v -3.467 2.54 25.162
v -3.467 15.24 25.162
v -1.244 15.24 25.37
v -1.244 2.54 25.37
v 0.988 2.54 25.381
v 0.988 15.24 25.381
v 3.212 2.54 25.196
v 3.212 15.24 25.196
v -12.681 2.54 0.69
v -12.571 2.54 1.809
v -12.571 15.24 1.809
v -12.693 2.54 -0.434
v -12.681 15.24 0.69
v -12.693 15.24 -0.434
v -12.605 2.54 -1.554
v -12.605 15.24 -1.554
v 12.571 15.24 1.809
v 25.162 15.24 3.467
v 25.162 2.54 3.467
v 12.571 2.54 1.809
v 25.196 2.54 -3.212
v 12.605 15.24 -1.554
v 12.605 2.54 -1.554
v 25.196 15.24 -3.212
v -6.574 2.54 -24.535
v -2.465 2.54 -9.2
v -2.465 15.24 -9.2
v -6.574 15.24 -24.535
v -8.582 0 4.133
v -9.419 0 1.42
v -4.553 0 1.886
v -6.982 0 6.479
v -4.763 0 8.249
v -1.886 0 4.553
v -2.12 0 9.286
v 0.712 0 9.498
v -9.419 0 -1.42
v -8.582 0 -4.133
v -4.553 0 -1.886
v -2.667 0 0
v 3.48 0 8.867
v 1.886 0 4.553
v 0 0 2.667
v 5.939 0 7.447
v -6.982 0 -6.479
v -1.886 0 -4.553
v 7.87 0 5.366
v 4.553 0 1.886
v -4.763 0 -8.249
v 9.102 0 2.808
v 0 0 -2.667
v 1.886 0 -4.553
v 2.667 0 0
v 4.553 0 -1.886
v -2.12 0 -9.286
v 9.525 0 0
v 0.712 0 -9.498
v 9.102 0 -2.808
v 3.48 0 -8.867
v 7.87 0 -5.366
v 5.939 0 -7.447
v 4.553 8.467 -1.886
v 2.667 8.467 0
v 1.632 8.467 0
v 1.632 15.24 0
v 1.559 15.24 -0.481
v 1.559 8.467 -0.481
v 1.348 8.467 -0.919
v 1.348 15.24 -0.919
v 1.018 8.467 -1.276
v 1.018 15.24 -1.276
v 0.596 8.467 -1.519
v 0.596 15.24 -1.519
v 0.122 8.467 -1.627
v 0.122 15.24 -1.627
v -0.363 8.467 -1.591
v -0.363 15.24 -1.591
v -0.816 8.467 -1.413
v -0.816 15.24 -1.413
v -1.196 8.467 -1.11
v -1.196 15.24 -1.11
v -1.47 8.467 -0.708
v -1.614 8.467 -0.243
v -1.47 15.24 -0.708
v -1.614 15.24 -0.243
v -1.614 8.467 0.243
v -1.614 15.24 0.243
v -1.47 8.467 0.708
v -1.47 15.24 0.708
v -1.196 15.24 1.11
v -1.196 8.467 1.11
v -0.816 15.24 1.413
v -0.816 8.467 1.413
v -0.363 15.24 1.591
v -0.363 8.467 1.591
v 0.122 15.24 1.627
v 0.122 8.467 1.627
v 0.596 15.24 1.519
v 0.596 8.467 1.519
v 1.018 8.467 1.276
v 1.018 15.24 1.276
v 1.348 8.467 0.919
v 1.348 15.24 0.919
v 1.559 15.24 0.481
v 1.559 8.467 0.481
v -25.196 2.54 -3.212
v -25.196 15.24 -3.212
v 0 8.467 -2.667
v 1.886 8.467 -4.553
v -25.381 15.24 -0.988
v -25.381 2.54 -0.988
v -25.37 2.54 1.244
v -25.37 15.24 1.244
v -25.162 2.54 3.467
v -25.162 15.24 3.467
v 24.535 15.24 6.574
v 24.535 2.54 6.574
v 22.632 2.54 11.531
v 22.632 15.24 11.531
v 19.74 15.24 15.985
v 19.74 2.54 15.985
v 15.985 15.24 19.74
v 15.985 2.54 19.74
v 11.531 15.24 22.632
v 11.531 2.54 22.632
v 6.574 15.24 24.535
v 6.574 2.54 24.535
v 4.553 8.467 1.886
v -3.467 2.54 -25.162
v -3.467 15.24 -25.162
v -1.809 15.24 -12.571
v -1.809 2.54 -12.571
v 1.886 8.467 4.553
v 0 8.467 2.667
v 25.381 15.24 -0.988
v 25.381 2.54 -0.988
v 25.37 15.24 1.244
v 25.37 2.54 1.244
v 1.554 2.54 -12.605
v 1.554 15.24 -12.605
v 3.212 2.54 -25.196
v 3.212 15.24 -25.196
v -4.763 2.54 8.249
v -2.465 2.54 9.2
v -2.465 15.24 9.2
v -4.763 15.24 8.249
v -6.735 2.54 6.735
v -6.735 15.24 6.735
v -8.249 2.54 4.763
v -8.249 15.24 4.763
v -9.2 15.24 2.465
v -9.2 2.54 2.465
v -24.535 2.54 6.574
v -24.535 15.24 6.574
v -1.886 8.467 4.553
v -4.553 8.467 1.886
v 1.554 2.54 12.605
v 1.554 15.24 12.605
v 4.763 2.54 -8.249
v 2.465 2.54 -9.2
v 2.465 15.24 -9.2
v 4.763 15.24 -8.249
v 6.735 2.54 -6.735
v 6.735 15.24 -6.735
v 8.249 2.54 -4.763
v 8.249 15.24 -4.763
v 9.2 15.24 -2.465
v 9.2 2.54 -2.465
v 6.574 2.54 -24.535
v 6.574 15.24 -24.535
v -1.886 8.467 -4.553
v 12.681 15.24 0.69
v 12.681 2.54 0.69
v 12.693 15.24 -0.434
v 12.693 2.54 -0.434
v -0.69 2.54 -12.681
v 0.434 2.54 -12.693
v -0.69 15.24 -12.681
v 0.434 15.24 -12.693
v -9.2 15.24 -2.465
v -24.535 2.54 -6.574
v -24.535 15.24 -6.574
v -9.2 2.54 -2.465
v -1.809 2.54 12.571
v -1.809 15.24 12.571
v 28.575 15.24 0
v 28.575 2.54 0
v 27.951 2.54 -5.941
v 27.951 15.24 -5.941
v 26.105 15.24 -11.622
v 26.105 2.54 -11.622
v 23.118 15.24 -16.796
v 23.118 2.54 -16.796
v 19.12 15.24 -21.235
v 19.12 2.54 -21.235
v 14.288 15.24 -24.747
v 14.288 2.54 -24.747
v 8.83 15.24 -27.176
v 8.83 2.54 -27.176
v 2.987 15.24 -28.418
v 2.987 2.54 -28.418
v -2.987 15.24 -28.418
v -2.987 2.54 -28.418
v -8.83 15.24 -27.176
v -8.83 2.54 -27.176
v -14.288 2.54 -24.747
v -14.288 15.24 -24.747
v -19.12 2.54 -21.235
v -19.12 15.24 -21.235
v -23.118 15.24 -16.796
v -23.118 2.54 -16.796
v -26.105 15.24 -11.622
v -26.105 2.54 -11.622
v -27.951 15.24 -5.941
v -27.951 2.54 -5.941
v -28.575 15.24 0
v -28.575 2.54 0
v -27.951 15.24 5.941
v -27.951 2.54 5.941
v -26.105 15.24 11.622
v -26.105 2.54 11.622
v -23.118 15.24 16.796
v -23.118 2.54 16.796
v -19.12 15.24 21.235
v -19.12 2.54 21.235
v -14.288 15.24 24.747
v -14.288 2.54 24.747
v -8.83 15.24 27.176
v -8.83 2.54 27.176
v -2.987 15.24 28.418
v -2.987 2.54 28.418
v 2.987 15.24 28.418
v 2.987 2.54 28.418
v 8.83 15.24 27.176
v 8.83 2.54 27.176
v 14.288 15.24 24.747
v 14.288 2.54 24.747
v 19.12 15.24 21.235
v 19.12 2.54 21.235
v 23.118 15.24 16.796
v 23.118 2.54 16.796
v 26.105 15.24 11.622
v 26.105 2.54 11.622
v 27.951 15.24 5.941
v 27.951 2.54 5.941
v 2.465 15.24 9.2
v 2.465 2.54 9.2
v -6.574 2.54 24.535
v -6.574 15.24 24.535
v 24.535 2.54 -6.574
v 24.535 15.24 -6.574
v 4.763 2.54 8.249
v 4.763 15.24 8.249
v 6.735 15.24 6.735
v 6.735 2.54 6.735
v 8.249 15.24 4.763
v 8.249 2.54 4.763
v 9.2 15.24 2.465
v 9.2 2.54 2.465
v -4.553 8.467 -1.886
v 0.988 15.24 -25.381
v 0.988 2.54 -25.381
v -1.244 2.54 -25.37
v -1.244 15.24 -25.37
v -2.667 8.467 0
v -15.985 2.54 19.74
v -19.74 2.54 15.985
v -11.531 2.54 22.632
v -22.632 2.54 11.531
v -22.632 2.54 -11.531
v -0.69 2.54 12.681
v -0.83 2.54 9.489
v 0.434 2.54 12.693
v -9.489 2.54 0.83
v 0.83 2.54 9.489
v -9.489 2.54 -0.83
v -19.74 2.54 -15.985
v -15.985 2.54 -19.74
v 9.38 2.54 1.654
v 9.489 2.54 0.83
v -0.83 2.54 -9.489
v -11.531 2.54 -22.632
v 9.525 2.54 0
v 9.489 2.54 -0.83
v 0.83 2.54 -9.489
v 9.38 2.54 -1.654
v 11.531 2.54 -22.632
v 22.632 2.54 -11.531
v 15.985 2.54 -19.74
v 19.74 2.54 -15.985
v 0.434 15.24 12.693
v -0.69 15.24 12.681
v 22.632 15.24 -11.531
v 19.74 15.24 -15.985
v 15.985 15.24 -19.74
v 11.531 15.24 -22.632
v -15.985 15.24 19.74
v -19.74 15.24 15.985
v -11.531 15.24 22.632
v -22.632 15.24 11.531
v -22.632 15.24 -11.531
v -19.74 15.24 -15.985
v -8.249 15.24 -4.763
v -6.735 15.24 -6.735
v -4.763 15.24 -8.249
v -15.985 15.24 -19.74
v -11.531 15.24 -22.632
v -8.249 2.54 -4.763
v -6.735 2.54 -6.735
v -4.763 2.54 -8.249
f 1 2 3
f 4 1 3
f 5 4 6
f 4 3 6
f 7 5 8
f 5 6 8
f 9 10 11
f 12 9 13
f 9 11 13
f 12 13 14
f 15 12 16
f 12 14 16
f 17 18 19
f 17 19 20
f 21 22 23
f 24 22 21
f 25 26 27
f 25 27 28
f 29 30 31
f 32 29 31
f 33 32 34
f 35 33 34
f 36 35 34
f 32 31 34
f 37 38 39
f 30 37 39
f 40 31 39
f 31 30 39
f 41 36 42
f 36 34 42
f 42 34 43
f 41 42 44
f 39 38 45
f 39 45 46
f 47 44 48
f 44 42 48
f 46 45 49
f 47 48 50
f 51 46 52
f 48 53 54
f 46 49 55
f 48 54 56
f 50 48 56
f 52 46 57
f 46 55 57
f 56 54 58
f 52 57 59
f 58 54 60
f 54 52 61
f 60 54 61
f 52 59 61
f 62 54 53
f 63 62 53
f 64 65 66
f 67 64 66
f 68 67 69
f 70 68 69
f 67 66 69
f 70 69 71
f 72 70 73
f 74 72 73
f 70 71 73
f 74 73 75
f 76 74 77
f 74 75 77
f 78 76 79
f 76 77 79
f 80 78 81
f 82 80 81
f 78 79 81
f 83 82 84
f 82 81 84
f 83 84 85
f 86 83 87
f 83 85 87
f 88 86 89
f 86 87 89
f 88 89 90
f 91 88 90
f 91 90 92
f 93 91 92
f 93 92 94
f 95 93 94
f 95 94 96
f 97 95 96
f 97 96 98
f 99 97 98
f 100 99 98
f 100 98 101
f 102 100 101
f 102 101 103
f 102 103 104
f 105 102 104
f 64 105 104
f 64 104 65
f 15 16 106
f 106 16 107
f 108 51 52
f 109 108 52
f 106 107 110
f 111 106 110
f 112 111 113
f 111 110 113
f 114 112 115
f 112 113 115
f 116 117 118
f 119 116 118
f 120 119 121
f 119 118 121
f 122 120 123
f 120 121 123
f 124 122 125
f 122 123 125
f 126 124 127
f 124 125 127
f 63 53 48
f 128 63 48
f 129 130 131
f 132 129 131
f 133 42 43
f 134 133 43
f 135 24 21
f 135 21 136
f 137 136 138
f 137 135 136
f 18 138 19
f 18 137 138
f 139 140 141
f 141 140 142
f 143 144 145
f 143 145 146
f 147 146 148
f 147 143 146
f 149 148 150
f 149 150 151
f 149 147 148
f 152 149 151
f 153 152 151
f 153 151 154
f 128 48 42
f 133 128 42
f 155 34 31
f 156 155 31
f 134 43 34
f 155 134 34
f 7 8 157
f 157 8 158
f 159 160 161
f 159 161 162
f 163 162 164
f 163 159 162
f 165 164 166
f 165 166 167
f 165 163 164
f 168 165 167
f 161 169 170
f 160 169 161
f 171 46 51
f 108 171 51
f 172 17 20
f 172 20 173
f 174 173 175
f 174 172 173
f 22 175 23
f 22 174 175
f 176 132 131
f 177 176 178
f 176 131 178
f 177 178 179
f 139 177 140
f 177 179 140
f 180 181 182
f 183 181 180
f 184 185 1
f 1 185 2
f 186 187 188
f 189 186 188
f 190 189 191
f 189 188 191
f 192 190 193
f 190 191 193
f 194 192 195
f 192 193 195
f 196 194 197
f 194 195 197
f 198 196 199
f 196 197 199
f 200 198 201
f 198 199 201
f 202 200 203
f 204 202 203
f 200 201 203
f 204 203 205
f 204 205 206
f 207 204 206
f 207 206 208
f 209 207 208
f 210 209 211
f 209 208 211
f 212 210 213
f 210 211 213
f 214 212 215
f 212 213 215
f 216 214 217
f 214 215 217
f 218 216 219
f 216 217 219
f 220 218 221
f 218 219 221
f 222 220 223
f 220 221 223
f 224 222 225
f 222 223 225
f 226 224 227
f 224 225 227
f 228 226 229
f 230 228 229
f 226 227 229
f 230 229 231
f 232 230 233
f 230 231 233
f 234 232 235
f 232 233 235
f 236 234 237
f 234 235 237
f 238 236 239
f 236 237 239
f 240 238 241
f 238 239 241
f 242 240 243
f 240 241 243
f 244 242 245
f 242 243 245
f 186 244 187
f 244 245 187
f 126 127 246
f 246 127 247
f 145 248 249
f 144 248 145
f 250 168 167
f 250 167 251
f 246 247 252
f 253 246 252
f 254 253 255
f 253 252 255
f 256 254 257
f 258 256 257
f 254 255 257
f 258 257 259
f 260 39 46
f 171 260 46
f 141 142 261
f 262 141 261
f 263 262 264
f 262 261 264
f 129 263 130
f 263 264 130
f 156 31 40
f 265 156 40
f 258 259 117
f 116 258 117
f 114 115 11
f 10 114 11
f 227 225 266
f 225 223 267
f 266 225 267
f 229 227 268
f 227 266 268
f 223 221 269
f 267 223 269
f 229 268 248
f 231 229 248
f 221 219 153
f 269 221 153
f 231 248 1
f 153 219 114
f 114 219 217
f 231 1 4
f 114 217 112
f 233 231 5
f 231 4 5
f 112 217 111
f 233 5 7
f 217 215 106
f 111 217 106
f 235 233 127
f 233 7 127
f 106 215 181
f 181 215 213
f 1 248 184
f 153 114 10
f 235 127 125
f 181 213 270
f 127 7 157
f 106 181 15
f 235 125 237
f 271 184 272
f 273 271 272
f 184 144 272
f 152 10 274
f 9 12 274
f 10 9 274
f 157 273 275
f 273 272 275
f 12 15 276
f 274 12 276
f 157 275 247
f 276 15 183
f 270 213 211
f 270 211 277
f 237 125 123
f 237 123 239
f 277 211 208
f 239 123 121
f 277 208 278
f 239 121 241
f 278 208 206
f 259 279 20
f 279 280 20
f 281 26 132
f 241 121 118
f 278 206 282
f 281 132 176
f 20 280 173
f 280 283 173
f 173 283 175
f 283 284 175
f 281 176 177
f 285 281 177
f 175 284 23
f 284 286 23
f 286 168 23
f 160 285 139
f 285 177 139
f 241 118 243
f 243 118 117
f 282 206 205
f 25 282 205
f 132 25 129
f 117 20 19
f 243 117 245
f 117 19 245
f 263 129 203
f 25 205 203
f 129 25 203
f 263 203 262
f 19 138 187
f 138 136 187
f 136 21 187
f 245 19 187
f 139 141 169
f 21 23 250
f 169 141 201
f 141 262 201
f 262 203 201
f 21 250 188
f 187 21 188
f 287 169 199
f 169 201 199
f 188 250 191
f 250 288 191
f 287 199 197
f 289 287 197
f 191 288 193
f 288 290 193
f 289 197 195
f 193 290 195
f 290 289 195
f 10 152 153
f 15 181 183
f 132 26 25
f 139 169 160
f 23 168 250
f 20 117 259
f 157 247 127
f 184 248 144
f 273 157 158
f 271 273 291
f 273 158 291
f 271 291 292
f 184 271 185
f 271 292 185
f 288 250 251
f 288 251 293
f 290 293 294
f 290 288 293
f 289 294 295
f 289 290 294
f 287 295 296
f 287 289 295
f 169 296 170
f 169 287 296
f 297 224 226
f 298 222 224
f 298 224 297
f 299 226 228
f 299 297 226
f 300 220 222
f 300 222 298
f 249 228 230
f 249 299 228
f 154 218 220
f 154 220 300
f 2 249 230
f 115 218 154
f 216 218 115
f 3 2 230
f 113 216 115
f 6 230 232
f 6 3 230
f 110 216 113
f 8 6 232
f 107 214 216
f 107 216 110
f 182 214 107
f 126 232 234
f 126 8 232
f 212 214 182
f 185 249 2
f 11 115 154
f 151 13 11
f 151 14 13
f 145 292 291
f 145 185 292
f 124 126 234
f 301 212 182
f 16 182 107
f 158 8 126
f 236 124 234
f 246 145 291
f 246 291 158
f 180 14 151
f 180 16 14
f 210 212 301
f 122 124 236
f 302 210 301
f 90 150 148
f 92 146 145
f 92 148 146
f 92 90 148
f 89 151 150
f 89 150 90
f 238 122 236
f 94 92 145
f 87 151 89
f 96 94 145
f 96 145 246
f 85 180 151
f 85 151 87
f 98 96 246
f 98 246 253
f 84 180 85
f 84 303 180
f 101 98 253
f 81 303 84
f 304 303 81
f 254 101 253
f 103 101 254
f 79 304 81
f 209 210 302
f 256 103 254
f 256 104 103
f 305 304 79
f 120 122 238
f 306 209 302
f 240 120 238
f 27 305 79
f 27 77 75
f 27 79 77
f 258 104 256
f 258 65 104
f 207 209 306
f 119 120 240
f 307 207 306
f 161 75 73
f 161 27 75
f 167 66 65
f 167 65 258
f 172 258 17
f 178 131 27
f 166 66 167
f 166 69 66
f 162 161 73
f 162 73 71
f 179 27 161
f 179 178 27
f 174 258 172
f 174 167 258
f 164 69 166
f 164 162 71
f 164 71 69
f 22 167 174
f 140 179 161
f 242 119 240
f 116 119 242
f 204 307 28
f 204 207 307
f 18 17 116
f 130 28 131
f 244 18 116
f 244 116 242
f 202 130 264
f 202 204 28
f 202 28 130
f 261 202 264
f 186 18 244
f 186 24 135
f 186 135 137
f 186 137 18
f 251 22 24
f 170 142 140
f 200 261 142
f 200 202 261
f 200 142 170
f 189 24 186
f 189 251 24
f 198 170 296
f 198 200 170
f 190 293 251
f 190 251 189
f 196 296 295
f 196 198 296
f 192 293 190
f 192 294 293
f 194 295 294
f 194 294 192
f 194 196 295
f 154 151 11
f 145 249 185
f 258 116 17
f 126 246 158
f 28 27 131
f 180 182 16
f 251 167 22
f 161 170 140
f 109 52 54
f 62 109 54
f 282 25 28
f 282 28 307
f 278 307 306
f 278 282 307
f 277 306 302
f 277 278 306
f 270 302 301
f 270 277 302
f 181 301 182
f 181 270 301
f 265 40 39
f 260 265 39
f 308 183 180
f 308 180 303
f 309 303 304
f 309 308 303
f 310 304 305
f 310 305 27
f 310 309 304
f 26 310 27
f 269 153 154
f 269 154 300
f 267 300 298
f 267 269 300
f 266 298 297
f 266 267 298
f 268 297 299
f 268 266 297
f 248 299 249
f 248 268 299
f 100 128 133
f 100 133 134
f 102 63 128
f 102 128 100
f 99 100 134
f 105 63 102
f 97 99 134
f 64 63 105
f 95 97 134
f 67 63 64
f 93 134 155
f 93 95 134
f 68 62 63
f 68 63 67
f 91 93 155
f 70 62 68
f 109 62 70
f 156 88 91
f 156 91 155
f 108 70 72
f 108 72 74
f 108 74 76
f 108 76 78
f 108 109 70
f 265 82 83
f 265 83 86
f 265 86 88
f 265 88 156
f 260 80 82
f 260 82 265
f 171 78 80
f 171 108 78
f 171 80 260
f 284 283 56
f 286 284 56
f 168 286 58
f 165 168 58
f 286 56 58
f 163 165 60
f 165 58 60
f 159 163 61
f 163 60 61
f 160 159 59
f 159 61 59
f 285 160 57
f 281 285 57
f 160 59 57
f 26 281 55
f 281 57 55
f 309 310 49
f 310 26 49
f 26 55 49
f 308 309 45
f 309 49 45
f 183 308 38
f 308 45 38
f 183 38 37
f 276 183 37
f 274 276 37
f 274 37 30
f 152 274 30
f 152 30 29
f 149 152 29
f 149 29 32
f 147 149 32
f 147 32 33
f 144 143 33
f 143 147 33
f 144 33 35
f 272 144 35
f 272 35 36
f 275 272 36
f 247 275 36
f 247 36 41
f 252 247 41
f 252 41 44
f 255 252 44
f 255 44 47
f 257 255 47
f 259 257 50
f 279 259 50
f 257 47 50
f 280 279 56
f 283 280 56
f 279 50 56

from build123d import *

# Parameters (mm, degrees)
SKETCH1_R           = 9.525
BOSS_EXTRUDE1_DEPTH = 2.54
SKETCH3_R           = 28.575
BOSS_EXTRUDE2_DEPTH = 12.7
CUT_EXTRUDE2_DEPTH  = 16.24
CUT_EXTRUDE3_DEPTH  = 8.466666667
SKETCH5_R           = 1.63195
CUT_EXTRUDE4_DEPTH  = 16.24


with BuildPart() as part:
    # Sketch1 → Boss-Extrude1 (new body)
    with BuildSketch(Plane(origin=(0, 0, 0), x_dir=(1, 0, 0), z_dir=(0, 1, 0))):
        Circle(SKETCH1_R)
    extrude(amount=BOSS_EXTRUDE1_DEPTH)

    # Sketch3 → Boss-Extrude2 (add)
    with BuildSketch(Plane(origin=(0, 2.54, 0), x_dir=(1, 0, 0), z_dir=(0, 1, 0))):
        Circle(SKETCH3_R)
        with BuildLine():
            Line((-2.465251405, 9.200443495), (-6.574003746, 24.534515988))
            ThreePointArc((-6.574003746, 24.534515988), (-17.960512242, 17.960512242), (-24.534515988, 6.574003746))
            Line((-24.534515988, 6.574003746), (-9.200443495, 2.465251405))
            ThreePointArc((-9.200443495, 2.465251405), (-6.735192091, 6.735192091), (-2.465251405, 9.200443495))
        make_face(mode=Mode.SUBTRACT)
        with BuildLine():
            Line((9.200443495, 2.465251405), (24.534515988, 6.574003746))
            ThreePointArc((24.534515988, 6.574003746), (17.960512242, 17.960512242), (6.574003746, 24.534515988))
            Line((6.574003746, 24.534515988), (2.465251405, 9.200443495))
            ThreePointArc((2.465251405, 9.200443495), (6.735192091, 6.735192091), (9.200443495, 2.465251405))
        make_face(mode=Mode.SUBTRACT)
        with BuildLine():
            Line((9.200443495, -2.465251405), (24.534515988, -6.574003746))
            ThreePointArc((24.534515988, -6.574003746), (17.960512242, -17.960512242), (6.574003746, -24.534515988))
            Line((6.574003746, -24.534515988), (2.465251405, -9.200443495))
            ThreePointArc((2.465251405, -9.200443495), (6.735192091, -6.735192091), (9.200443495, -2.465251405))
        make_face(mode=Mode.SUBTRACT)
        with BuildLine():
            Line((-9.200443495, -2.465251405), (-24.534515988, -6.574003746))
            ThreePointArc((-24.534515988, -6.574003746), (-17.960512242, -17.960512242), (-6.574003746, -24.534515988))
            Line((-6.574003746, -24.534515988), (-2.465251405, -9.200443495))
            ThreePointArc((-2.465251405, -9.200443495), (-6.735192091, -6.735192091), (-9.200443495, -2.465251405))
        make_face(mode=Mode.SUBTRACT)
    extrude(amount=BOSS_EXTRUDE2_DEPTH)

    # Sketch4 → Cut-Extrude2 (cut, through all)
    with BuildSketch(Plane(origin=(0, 15.24, 0), x_dir=(1, 0, 0), z_dir=(0, 1, 0))):
        with BuildLine():
            Line((12.604555768, 1.554082971), (25.196118384, 3.211793638))
            ThreePointArc((25.196118384, 3.211793638), (25.399675108, -0.128469484), (25.162340107, -3.466502611))
            Line((25.162340107, -3.466502611), (12.570536445, -1.80876021))
            ThreePointArc((12.570536445, -1.80876021), (12.699350202, -0.128469656), (12.604555768, 1.554082971))
        make_face()
        with BuildLine():
            Line((-12.604555768, 1.554082971), (-25.196118384, 3.211793638))
            ThreePointArc((-25.196118384, 3.211793638), (-25.399675108, -0.128469484), (-25.162340107, -3.466502611))
            Line((-25.162340107, -3.466502611), (-12.570536445, -1.80876021))
            ThreePointArc((-12.570536445, -1.80876021), (-12.699350202, -0.128469656), (-12.604555768, 1.554082971))
        make_face()
        with BuildLine():
            Line((1.554082971, 12.604555768), (3.211793638, 25.196118384))
            ThreePointArc((3.211793638, 25.196118384), (-0.128469484, 25.399675108), (-3.466502611, 25.162340107))
            Line((-3.466502611, 25.162340107), (-1.80876021, 12.570536445))
            ThreePointArc((-1.80876021, 12.570536445), (-0.128469656, 12.699350202), (1.554082971, 12.604555768))
        make_face()
        with BuildLine():
            Line((-1.80876021, -12.570536445), (-3.466502611, -25.162340107))
            ThreePointArc((-3.466502611, -25.162340107), (-0.128469484, -25.399675108), (3.211793638, -25.196118384))
            Line((3.211793638, -25.196118384), (1.554082971, -12.604555768))
            ThreePointArc((1.554082971, -12.604555768), (-0.128469656, -12.699350202), (-1.80876021, -12.570536445))
        make_face()
    extrude(amount=-CUT_EXTRUDE2_DEPTH, mode=Mode.SUBTRACT)

    # Sketch2 → Cut-Extrude3 (cut)
    with BuildSketch(Plane(origin=(0, 0, 0), x_dir=(1, 0, 0), z_dir=(0, 1, 0))):
        Polygon((-4.552853785, 1.885853785), (-1.885853785, 4.552853785), (0, 2.667), (1.885853785, 4.552853785), (4.552853785, 1.885853785), (2.667, 0), (4.552853785, -1.885853785), (1.885853785, -4.552853785), (0, -2.667), (-1.885853785, -4.552853785), (-4.552853785, -1.885853785), (-2.667, 0), align=None)
    extrude(amount=CUT_EXTRUDE3_DEPTH, mode=Mode.SUBTRACT)

    # Sketch5 → Cut-Extrude4 (cut, through all)
    with BuildSketch(Plane(origin=(0, 15.24, 0), x_dir=(1, 0, 0), z_dir=(0, 1, 0))):
        Circle(SKETCH5_R)
    extrude(amount=-CUT_EXTRUDE4_DEPTH, mode=Mode.SUBTRACT)


solid = part.part
